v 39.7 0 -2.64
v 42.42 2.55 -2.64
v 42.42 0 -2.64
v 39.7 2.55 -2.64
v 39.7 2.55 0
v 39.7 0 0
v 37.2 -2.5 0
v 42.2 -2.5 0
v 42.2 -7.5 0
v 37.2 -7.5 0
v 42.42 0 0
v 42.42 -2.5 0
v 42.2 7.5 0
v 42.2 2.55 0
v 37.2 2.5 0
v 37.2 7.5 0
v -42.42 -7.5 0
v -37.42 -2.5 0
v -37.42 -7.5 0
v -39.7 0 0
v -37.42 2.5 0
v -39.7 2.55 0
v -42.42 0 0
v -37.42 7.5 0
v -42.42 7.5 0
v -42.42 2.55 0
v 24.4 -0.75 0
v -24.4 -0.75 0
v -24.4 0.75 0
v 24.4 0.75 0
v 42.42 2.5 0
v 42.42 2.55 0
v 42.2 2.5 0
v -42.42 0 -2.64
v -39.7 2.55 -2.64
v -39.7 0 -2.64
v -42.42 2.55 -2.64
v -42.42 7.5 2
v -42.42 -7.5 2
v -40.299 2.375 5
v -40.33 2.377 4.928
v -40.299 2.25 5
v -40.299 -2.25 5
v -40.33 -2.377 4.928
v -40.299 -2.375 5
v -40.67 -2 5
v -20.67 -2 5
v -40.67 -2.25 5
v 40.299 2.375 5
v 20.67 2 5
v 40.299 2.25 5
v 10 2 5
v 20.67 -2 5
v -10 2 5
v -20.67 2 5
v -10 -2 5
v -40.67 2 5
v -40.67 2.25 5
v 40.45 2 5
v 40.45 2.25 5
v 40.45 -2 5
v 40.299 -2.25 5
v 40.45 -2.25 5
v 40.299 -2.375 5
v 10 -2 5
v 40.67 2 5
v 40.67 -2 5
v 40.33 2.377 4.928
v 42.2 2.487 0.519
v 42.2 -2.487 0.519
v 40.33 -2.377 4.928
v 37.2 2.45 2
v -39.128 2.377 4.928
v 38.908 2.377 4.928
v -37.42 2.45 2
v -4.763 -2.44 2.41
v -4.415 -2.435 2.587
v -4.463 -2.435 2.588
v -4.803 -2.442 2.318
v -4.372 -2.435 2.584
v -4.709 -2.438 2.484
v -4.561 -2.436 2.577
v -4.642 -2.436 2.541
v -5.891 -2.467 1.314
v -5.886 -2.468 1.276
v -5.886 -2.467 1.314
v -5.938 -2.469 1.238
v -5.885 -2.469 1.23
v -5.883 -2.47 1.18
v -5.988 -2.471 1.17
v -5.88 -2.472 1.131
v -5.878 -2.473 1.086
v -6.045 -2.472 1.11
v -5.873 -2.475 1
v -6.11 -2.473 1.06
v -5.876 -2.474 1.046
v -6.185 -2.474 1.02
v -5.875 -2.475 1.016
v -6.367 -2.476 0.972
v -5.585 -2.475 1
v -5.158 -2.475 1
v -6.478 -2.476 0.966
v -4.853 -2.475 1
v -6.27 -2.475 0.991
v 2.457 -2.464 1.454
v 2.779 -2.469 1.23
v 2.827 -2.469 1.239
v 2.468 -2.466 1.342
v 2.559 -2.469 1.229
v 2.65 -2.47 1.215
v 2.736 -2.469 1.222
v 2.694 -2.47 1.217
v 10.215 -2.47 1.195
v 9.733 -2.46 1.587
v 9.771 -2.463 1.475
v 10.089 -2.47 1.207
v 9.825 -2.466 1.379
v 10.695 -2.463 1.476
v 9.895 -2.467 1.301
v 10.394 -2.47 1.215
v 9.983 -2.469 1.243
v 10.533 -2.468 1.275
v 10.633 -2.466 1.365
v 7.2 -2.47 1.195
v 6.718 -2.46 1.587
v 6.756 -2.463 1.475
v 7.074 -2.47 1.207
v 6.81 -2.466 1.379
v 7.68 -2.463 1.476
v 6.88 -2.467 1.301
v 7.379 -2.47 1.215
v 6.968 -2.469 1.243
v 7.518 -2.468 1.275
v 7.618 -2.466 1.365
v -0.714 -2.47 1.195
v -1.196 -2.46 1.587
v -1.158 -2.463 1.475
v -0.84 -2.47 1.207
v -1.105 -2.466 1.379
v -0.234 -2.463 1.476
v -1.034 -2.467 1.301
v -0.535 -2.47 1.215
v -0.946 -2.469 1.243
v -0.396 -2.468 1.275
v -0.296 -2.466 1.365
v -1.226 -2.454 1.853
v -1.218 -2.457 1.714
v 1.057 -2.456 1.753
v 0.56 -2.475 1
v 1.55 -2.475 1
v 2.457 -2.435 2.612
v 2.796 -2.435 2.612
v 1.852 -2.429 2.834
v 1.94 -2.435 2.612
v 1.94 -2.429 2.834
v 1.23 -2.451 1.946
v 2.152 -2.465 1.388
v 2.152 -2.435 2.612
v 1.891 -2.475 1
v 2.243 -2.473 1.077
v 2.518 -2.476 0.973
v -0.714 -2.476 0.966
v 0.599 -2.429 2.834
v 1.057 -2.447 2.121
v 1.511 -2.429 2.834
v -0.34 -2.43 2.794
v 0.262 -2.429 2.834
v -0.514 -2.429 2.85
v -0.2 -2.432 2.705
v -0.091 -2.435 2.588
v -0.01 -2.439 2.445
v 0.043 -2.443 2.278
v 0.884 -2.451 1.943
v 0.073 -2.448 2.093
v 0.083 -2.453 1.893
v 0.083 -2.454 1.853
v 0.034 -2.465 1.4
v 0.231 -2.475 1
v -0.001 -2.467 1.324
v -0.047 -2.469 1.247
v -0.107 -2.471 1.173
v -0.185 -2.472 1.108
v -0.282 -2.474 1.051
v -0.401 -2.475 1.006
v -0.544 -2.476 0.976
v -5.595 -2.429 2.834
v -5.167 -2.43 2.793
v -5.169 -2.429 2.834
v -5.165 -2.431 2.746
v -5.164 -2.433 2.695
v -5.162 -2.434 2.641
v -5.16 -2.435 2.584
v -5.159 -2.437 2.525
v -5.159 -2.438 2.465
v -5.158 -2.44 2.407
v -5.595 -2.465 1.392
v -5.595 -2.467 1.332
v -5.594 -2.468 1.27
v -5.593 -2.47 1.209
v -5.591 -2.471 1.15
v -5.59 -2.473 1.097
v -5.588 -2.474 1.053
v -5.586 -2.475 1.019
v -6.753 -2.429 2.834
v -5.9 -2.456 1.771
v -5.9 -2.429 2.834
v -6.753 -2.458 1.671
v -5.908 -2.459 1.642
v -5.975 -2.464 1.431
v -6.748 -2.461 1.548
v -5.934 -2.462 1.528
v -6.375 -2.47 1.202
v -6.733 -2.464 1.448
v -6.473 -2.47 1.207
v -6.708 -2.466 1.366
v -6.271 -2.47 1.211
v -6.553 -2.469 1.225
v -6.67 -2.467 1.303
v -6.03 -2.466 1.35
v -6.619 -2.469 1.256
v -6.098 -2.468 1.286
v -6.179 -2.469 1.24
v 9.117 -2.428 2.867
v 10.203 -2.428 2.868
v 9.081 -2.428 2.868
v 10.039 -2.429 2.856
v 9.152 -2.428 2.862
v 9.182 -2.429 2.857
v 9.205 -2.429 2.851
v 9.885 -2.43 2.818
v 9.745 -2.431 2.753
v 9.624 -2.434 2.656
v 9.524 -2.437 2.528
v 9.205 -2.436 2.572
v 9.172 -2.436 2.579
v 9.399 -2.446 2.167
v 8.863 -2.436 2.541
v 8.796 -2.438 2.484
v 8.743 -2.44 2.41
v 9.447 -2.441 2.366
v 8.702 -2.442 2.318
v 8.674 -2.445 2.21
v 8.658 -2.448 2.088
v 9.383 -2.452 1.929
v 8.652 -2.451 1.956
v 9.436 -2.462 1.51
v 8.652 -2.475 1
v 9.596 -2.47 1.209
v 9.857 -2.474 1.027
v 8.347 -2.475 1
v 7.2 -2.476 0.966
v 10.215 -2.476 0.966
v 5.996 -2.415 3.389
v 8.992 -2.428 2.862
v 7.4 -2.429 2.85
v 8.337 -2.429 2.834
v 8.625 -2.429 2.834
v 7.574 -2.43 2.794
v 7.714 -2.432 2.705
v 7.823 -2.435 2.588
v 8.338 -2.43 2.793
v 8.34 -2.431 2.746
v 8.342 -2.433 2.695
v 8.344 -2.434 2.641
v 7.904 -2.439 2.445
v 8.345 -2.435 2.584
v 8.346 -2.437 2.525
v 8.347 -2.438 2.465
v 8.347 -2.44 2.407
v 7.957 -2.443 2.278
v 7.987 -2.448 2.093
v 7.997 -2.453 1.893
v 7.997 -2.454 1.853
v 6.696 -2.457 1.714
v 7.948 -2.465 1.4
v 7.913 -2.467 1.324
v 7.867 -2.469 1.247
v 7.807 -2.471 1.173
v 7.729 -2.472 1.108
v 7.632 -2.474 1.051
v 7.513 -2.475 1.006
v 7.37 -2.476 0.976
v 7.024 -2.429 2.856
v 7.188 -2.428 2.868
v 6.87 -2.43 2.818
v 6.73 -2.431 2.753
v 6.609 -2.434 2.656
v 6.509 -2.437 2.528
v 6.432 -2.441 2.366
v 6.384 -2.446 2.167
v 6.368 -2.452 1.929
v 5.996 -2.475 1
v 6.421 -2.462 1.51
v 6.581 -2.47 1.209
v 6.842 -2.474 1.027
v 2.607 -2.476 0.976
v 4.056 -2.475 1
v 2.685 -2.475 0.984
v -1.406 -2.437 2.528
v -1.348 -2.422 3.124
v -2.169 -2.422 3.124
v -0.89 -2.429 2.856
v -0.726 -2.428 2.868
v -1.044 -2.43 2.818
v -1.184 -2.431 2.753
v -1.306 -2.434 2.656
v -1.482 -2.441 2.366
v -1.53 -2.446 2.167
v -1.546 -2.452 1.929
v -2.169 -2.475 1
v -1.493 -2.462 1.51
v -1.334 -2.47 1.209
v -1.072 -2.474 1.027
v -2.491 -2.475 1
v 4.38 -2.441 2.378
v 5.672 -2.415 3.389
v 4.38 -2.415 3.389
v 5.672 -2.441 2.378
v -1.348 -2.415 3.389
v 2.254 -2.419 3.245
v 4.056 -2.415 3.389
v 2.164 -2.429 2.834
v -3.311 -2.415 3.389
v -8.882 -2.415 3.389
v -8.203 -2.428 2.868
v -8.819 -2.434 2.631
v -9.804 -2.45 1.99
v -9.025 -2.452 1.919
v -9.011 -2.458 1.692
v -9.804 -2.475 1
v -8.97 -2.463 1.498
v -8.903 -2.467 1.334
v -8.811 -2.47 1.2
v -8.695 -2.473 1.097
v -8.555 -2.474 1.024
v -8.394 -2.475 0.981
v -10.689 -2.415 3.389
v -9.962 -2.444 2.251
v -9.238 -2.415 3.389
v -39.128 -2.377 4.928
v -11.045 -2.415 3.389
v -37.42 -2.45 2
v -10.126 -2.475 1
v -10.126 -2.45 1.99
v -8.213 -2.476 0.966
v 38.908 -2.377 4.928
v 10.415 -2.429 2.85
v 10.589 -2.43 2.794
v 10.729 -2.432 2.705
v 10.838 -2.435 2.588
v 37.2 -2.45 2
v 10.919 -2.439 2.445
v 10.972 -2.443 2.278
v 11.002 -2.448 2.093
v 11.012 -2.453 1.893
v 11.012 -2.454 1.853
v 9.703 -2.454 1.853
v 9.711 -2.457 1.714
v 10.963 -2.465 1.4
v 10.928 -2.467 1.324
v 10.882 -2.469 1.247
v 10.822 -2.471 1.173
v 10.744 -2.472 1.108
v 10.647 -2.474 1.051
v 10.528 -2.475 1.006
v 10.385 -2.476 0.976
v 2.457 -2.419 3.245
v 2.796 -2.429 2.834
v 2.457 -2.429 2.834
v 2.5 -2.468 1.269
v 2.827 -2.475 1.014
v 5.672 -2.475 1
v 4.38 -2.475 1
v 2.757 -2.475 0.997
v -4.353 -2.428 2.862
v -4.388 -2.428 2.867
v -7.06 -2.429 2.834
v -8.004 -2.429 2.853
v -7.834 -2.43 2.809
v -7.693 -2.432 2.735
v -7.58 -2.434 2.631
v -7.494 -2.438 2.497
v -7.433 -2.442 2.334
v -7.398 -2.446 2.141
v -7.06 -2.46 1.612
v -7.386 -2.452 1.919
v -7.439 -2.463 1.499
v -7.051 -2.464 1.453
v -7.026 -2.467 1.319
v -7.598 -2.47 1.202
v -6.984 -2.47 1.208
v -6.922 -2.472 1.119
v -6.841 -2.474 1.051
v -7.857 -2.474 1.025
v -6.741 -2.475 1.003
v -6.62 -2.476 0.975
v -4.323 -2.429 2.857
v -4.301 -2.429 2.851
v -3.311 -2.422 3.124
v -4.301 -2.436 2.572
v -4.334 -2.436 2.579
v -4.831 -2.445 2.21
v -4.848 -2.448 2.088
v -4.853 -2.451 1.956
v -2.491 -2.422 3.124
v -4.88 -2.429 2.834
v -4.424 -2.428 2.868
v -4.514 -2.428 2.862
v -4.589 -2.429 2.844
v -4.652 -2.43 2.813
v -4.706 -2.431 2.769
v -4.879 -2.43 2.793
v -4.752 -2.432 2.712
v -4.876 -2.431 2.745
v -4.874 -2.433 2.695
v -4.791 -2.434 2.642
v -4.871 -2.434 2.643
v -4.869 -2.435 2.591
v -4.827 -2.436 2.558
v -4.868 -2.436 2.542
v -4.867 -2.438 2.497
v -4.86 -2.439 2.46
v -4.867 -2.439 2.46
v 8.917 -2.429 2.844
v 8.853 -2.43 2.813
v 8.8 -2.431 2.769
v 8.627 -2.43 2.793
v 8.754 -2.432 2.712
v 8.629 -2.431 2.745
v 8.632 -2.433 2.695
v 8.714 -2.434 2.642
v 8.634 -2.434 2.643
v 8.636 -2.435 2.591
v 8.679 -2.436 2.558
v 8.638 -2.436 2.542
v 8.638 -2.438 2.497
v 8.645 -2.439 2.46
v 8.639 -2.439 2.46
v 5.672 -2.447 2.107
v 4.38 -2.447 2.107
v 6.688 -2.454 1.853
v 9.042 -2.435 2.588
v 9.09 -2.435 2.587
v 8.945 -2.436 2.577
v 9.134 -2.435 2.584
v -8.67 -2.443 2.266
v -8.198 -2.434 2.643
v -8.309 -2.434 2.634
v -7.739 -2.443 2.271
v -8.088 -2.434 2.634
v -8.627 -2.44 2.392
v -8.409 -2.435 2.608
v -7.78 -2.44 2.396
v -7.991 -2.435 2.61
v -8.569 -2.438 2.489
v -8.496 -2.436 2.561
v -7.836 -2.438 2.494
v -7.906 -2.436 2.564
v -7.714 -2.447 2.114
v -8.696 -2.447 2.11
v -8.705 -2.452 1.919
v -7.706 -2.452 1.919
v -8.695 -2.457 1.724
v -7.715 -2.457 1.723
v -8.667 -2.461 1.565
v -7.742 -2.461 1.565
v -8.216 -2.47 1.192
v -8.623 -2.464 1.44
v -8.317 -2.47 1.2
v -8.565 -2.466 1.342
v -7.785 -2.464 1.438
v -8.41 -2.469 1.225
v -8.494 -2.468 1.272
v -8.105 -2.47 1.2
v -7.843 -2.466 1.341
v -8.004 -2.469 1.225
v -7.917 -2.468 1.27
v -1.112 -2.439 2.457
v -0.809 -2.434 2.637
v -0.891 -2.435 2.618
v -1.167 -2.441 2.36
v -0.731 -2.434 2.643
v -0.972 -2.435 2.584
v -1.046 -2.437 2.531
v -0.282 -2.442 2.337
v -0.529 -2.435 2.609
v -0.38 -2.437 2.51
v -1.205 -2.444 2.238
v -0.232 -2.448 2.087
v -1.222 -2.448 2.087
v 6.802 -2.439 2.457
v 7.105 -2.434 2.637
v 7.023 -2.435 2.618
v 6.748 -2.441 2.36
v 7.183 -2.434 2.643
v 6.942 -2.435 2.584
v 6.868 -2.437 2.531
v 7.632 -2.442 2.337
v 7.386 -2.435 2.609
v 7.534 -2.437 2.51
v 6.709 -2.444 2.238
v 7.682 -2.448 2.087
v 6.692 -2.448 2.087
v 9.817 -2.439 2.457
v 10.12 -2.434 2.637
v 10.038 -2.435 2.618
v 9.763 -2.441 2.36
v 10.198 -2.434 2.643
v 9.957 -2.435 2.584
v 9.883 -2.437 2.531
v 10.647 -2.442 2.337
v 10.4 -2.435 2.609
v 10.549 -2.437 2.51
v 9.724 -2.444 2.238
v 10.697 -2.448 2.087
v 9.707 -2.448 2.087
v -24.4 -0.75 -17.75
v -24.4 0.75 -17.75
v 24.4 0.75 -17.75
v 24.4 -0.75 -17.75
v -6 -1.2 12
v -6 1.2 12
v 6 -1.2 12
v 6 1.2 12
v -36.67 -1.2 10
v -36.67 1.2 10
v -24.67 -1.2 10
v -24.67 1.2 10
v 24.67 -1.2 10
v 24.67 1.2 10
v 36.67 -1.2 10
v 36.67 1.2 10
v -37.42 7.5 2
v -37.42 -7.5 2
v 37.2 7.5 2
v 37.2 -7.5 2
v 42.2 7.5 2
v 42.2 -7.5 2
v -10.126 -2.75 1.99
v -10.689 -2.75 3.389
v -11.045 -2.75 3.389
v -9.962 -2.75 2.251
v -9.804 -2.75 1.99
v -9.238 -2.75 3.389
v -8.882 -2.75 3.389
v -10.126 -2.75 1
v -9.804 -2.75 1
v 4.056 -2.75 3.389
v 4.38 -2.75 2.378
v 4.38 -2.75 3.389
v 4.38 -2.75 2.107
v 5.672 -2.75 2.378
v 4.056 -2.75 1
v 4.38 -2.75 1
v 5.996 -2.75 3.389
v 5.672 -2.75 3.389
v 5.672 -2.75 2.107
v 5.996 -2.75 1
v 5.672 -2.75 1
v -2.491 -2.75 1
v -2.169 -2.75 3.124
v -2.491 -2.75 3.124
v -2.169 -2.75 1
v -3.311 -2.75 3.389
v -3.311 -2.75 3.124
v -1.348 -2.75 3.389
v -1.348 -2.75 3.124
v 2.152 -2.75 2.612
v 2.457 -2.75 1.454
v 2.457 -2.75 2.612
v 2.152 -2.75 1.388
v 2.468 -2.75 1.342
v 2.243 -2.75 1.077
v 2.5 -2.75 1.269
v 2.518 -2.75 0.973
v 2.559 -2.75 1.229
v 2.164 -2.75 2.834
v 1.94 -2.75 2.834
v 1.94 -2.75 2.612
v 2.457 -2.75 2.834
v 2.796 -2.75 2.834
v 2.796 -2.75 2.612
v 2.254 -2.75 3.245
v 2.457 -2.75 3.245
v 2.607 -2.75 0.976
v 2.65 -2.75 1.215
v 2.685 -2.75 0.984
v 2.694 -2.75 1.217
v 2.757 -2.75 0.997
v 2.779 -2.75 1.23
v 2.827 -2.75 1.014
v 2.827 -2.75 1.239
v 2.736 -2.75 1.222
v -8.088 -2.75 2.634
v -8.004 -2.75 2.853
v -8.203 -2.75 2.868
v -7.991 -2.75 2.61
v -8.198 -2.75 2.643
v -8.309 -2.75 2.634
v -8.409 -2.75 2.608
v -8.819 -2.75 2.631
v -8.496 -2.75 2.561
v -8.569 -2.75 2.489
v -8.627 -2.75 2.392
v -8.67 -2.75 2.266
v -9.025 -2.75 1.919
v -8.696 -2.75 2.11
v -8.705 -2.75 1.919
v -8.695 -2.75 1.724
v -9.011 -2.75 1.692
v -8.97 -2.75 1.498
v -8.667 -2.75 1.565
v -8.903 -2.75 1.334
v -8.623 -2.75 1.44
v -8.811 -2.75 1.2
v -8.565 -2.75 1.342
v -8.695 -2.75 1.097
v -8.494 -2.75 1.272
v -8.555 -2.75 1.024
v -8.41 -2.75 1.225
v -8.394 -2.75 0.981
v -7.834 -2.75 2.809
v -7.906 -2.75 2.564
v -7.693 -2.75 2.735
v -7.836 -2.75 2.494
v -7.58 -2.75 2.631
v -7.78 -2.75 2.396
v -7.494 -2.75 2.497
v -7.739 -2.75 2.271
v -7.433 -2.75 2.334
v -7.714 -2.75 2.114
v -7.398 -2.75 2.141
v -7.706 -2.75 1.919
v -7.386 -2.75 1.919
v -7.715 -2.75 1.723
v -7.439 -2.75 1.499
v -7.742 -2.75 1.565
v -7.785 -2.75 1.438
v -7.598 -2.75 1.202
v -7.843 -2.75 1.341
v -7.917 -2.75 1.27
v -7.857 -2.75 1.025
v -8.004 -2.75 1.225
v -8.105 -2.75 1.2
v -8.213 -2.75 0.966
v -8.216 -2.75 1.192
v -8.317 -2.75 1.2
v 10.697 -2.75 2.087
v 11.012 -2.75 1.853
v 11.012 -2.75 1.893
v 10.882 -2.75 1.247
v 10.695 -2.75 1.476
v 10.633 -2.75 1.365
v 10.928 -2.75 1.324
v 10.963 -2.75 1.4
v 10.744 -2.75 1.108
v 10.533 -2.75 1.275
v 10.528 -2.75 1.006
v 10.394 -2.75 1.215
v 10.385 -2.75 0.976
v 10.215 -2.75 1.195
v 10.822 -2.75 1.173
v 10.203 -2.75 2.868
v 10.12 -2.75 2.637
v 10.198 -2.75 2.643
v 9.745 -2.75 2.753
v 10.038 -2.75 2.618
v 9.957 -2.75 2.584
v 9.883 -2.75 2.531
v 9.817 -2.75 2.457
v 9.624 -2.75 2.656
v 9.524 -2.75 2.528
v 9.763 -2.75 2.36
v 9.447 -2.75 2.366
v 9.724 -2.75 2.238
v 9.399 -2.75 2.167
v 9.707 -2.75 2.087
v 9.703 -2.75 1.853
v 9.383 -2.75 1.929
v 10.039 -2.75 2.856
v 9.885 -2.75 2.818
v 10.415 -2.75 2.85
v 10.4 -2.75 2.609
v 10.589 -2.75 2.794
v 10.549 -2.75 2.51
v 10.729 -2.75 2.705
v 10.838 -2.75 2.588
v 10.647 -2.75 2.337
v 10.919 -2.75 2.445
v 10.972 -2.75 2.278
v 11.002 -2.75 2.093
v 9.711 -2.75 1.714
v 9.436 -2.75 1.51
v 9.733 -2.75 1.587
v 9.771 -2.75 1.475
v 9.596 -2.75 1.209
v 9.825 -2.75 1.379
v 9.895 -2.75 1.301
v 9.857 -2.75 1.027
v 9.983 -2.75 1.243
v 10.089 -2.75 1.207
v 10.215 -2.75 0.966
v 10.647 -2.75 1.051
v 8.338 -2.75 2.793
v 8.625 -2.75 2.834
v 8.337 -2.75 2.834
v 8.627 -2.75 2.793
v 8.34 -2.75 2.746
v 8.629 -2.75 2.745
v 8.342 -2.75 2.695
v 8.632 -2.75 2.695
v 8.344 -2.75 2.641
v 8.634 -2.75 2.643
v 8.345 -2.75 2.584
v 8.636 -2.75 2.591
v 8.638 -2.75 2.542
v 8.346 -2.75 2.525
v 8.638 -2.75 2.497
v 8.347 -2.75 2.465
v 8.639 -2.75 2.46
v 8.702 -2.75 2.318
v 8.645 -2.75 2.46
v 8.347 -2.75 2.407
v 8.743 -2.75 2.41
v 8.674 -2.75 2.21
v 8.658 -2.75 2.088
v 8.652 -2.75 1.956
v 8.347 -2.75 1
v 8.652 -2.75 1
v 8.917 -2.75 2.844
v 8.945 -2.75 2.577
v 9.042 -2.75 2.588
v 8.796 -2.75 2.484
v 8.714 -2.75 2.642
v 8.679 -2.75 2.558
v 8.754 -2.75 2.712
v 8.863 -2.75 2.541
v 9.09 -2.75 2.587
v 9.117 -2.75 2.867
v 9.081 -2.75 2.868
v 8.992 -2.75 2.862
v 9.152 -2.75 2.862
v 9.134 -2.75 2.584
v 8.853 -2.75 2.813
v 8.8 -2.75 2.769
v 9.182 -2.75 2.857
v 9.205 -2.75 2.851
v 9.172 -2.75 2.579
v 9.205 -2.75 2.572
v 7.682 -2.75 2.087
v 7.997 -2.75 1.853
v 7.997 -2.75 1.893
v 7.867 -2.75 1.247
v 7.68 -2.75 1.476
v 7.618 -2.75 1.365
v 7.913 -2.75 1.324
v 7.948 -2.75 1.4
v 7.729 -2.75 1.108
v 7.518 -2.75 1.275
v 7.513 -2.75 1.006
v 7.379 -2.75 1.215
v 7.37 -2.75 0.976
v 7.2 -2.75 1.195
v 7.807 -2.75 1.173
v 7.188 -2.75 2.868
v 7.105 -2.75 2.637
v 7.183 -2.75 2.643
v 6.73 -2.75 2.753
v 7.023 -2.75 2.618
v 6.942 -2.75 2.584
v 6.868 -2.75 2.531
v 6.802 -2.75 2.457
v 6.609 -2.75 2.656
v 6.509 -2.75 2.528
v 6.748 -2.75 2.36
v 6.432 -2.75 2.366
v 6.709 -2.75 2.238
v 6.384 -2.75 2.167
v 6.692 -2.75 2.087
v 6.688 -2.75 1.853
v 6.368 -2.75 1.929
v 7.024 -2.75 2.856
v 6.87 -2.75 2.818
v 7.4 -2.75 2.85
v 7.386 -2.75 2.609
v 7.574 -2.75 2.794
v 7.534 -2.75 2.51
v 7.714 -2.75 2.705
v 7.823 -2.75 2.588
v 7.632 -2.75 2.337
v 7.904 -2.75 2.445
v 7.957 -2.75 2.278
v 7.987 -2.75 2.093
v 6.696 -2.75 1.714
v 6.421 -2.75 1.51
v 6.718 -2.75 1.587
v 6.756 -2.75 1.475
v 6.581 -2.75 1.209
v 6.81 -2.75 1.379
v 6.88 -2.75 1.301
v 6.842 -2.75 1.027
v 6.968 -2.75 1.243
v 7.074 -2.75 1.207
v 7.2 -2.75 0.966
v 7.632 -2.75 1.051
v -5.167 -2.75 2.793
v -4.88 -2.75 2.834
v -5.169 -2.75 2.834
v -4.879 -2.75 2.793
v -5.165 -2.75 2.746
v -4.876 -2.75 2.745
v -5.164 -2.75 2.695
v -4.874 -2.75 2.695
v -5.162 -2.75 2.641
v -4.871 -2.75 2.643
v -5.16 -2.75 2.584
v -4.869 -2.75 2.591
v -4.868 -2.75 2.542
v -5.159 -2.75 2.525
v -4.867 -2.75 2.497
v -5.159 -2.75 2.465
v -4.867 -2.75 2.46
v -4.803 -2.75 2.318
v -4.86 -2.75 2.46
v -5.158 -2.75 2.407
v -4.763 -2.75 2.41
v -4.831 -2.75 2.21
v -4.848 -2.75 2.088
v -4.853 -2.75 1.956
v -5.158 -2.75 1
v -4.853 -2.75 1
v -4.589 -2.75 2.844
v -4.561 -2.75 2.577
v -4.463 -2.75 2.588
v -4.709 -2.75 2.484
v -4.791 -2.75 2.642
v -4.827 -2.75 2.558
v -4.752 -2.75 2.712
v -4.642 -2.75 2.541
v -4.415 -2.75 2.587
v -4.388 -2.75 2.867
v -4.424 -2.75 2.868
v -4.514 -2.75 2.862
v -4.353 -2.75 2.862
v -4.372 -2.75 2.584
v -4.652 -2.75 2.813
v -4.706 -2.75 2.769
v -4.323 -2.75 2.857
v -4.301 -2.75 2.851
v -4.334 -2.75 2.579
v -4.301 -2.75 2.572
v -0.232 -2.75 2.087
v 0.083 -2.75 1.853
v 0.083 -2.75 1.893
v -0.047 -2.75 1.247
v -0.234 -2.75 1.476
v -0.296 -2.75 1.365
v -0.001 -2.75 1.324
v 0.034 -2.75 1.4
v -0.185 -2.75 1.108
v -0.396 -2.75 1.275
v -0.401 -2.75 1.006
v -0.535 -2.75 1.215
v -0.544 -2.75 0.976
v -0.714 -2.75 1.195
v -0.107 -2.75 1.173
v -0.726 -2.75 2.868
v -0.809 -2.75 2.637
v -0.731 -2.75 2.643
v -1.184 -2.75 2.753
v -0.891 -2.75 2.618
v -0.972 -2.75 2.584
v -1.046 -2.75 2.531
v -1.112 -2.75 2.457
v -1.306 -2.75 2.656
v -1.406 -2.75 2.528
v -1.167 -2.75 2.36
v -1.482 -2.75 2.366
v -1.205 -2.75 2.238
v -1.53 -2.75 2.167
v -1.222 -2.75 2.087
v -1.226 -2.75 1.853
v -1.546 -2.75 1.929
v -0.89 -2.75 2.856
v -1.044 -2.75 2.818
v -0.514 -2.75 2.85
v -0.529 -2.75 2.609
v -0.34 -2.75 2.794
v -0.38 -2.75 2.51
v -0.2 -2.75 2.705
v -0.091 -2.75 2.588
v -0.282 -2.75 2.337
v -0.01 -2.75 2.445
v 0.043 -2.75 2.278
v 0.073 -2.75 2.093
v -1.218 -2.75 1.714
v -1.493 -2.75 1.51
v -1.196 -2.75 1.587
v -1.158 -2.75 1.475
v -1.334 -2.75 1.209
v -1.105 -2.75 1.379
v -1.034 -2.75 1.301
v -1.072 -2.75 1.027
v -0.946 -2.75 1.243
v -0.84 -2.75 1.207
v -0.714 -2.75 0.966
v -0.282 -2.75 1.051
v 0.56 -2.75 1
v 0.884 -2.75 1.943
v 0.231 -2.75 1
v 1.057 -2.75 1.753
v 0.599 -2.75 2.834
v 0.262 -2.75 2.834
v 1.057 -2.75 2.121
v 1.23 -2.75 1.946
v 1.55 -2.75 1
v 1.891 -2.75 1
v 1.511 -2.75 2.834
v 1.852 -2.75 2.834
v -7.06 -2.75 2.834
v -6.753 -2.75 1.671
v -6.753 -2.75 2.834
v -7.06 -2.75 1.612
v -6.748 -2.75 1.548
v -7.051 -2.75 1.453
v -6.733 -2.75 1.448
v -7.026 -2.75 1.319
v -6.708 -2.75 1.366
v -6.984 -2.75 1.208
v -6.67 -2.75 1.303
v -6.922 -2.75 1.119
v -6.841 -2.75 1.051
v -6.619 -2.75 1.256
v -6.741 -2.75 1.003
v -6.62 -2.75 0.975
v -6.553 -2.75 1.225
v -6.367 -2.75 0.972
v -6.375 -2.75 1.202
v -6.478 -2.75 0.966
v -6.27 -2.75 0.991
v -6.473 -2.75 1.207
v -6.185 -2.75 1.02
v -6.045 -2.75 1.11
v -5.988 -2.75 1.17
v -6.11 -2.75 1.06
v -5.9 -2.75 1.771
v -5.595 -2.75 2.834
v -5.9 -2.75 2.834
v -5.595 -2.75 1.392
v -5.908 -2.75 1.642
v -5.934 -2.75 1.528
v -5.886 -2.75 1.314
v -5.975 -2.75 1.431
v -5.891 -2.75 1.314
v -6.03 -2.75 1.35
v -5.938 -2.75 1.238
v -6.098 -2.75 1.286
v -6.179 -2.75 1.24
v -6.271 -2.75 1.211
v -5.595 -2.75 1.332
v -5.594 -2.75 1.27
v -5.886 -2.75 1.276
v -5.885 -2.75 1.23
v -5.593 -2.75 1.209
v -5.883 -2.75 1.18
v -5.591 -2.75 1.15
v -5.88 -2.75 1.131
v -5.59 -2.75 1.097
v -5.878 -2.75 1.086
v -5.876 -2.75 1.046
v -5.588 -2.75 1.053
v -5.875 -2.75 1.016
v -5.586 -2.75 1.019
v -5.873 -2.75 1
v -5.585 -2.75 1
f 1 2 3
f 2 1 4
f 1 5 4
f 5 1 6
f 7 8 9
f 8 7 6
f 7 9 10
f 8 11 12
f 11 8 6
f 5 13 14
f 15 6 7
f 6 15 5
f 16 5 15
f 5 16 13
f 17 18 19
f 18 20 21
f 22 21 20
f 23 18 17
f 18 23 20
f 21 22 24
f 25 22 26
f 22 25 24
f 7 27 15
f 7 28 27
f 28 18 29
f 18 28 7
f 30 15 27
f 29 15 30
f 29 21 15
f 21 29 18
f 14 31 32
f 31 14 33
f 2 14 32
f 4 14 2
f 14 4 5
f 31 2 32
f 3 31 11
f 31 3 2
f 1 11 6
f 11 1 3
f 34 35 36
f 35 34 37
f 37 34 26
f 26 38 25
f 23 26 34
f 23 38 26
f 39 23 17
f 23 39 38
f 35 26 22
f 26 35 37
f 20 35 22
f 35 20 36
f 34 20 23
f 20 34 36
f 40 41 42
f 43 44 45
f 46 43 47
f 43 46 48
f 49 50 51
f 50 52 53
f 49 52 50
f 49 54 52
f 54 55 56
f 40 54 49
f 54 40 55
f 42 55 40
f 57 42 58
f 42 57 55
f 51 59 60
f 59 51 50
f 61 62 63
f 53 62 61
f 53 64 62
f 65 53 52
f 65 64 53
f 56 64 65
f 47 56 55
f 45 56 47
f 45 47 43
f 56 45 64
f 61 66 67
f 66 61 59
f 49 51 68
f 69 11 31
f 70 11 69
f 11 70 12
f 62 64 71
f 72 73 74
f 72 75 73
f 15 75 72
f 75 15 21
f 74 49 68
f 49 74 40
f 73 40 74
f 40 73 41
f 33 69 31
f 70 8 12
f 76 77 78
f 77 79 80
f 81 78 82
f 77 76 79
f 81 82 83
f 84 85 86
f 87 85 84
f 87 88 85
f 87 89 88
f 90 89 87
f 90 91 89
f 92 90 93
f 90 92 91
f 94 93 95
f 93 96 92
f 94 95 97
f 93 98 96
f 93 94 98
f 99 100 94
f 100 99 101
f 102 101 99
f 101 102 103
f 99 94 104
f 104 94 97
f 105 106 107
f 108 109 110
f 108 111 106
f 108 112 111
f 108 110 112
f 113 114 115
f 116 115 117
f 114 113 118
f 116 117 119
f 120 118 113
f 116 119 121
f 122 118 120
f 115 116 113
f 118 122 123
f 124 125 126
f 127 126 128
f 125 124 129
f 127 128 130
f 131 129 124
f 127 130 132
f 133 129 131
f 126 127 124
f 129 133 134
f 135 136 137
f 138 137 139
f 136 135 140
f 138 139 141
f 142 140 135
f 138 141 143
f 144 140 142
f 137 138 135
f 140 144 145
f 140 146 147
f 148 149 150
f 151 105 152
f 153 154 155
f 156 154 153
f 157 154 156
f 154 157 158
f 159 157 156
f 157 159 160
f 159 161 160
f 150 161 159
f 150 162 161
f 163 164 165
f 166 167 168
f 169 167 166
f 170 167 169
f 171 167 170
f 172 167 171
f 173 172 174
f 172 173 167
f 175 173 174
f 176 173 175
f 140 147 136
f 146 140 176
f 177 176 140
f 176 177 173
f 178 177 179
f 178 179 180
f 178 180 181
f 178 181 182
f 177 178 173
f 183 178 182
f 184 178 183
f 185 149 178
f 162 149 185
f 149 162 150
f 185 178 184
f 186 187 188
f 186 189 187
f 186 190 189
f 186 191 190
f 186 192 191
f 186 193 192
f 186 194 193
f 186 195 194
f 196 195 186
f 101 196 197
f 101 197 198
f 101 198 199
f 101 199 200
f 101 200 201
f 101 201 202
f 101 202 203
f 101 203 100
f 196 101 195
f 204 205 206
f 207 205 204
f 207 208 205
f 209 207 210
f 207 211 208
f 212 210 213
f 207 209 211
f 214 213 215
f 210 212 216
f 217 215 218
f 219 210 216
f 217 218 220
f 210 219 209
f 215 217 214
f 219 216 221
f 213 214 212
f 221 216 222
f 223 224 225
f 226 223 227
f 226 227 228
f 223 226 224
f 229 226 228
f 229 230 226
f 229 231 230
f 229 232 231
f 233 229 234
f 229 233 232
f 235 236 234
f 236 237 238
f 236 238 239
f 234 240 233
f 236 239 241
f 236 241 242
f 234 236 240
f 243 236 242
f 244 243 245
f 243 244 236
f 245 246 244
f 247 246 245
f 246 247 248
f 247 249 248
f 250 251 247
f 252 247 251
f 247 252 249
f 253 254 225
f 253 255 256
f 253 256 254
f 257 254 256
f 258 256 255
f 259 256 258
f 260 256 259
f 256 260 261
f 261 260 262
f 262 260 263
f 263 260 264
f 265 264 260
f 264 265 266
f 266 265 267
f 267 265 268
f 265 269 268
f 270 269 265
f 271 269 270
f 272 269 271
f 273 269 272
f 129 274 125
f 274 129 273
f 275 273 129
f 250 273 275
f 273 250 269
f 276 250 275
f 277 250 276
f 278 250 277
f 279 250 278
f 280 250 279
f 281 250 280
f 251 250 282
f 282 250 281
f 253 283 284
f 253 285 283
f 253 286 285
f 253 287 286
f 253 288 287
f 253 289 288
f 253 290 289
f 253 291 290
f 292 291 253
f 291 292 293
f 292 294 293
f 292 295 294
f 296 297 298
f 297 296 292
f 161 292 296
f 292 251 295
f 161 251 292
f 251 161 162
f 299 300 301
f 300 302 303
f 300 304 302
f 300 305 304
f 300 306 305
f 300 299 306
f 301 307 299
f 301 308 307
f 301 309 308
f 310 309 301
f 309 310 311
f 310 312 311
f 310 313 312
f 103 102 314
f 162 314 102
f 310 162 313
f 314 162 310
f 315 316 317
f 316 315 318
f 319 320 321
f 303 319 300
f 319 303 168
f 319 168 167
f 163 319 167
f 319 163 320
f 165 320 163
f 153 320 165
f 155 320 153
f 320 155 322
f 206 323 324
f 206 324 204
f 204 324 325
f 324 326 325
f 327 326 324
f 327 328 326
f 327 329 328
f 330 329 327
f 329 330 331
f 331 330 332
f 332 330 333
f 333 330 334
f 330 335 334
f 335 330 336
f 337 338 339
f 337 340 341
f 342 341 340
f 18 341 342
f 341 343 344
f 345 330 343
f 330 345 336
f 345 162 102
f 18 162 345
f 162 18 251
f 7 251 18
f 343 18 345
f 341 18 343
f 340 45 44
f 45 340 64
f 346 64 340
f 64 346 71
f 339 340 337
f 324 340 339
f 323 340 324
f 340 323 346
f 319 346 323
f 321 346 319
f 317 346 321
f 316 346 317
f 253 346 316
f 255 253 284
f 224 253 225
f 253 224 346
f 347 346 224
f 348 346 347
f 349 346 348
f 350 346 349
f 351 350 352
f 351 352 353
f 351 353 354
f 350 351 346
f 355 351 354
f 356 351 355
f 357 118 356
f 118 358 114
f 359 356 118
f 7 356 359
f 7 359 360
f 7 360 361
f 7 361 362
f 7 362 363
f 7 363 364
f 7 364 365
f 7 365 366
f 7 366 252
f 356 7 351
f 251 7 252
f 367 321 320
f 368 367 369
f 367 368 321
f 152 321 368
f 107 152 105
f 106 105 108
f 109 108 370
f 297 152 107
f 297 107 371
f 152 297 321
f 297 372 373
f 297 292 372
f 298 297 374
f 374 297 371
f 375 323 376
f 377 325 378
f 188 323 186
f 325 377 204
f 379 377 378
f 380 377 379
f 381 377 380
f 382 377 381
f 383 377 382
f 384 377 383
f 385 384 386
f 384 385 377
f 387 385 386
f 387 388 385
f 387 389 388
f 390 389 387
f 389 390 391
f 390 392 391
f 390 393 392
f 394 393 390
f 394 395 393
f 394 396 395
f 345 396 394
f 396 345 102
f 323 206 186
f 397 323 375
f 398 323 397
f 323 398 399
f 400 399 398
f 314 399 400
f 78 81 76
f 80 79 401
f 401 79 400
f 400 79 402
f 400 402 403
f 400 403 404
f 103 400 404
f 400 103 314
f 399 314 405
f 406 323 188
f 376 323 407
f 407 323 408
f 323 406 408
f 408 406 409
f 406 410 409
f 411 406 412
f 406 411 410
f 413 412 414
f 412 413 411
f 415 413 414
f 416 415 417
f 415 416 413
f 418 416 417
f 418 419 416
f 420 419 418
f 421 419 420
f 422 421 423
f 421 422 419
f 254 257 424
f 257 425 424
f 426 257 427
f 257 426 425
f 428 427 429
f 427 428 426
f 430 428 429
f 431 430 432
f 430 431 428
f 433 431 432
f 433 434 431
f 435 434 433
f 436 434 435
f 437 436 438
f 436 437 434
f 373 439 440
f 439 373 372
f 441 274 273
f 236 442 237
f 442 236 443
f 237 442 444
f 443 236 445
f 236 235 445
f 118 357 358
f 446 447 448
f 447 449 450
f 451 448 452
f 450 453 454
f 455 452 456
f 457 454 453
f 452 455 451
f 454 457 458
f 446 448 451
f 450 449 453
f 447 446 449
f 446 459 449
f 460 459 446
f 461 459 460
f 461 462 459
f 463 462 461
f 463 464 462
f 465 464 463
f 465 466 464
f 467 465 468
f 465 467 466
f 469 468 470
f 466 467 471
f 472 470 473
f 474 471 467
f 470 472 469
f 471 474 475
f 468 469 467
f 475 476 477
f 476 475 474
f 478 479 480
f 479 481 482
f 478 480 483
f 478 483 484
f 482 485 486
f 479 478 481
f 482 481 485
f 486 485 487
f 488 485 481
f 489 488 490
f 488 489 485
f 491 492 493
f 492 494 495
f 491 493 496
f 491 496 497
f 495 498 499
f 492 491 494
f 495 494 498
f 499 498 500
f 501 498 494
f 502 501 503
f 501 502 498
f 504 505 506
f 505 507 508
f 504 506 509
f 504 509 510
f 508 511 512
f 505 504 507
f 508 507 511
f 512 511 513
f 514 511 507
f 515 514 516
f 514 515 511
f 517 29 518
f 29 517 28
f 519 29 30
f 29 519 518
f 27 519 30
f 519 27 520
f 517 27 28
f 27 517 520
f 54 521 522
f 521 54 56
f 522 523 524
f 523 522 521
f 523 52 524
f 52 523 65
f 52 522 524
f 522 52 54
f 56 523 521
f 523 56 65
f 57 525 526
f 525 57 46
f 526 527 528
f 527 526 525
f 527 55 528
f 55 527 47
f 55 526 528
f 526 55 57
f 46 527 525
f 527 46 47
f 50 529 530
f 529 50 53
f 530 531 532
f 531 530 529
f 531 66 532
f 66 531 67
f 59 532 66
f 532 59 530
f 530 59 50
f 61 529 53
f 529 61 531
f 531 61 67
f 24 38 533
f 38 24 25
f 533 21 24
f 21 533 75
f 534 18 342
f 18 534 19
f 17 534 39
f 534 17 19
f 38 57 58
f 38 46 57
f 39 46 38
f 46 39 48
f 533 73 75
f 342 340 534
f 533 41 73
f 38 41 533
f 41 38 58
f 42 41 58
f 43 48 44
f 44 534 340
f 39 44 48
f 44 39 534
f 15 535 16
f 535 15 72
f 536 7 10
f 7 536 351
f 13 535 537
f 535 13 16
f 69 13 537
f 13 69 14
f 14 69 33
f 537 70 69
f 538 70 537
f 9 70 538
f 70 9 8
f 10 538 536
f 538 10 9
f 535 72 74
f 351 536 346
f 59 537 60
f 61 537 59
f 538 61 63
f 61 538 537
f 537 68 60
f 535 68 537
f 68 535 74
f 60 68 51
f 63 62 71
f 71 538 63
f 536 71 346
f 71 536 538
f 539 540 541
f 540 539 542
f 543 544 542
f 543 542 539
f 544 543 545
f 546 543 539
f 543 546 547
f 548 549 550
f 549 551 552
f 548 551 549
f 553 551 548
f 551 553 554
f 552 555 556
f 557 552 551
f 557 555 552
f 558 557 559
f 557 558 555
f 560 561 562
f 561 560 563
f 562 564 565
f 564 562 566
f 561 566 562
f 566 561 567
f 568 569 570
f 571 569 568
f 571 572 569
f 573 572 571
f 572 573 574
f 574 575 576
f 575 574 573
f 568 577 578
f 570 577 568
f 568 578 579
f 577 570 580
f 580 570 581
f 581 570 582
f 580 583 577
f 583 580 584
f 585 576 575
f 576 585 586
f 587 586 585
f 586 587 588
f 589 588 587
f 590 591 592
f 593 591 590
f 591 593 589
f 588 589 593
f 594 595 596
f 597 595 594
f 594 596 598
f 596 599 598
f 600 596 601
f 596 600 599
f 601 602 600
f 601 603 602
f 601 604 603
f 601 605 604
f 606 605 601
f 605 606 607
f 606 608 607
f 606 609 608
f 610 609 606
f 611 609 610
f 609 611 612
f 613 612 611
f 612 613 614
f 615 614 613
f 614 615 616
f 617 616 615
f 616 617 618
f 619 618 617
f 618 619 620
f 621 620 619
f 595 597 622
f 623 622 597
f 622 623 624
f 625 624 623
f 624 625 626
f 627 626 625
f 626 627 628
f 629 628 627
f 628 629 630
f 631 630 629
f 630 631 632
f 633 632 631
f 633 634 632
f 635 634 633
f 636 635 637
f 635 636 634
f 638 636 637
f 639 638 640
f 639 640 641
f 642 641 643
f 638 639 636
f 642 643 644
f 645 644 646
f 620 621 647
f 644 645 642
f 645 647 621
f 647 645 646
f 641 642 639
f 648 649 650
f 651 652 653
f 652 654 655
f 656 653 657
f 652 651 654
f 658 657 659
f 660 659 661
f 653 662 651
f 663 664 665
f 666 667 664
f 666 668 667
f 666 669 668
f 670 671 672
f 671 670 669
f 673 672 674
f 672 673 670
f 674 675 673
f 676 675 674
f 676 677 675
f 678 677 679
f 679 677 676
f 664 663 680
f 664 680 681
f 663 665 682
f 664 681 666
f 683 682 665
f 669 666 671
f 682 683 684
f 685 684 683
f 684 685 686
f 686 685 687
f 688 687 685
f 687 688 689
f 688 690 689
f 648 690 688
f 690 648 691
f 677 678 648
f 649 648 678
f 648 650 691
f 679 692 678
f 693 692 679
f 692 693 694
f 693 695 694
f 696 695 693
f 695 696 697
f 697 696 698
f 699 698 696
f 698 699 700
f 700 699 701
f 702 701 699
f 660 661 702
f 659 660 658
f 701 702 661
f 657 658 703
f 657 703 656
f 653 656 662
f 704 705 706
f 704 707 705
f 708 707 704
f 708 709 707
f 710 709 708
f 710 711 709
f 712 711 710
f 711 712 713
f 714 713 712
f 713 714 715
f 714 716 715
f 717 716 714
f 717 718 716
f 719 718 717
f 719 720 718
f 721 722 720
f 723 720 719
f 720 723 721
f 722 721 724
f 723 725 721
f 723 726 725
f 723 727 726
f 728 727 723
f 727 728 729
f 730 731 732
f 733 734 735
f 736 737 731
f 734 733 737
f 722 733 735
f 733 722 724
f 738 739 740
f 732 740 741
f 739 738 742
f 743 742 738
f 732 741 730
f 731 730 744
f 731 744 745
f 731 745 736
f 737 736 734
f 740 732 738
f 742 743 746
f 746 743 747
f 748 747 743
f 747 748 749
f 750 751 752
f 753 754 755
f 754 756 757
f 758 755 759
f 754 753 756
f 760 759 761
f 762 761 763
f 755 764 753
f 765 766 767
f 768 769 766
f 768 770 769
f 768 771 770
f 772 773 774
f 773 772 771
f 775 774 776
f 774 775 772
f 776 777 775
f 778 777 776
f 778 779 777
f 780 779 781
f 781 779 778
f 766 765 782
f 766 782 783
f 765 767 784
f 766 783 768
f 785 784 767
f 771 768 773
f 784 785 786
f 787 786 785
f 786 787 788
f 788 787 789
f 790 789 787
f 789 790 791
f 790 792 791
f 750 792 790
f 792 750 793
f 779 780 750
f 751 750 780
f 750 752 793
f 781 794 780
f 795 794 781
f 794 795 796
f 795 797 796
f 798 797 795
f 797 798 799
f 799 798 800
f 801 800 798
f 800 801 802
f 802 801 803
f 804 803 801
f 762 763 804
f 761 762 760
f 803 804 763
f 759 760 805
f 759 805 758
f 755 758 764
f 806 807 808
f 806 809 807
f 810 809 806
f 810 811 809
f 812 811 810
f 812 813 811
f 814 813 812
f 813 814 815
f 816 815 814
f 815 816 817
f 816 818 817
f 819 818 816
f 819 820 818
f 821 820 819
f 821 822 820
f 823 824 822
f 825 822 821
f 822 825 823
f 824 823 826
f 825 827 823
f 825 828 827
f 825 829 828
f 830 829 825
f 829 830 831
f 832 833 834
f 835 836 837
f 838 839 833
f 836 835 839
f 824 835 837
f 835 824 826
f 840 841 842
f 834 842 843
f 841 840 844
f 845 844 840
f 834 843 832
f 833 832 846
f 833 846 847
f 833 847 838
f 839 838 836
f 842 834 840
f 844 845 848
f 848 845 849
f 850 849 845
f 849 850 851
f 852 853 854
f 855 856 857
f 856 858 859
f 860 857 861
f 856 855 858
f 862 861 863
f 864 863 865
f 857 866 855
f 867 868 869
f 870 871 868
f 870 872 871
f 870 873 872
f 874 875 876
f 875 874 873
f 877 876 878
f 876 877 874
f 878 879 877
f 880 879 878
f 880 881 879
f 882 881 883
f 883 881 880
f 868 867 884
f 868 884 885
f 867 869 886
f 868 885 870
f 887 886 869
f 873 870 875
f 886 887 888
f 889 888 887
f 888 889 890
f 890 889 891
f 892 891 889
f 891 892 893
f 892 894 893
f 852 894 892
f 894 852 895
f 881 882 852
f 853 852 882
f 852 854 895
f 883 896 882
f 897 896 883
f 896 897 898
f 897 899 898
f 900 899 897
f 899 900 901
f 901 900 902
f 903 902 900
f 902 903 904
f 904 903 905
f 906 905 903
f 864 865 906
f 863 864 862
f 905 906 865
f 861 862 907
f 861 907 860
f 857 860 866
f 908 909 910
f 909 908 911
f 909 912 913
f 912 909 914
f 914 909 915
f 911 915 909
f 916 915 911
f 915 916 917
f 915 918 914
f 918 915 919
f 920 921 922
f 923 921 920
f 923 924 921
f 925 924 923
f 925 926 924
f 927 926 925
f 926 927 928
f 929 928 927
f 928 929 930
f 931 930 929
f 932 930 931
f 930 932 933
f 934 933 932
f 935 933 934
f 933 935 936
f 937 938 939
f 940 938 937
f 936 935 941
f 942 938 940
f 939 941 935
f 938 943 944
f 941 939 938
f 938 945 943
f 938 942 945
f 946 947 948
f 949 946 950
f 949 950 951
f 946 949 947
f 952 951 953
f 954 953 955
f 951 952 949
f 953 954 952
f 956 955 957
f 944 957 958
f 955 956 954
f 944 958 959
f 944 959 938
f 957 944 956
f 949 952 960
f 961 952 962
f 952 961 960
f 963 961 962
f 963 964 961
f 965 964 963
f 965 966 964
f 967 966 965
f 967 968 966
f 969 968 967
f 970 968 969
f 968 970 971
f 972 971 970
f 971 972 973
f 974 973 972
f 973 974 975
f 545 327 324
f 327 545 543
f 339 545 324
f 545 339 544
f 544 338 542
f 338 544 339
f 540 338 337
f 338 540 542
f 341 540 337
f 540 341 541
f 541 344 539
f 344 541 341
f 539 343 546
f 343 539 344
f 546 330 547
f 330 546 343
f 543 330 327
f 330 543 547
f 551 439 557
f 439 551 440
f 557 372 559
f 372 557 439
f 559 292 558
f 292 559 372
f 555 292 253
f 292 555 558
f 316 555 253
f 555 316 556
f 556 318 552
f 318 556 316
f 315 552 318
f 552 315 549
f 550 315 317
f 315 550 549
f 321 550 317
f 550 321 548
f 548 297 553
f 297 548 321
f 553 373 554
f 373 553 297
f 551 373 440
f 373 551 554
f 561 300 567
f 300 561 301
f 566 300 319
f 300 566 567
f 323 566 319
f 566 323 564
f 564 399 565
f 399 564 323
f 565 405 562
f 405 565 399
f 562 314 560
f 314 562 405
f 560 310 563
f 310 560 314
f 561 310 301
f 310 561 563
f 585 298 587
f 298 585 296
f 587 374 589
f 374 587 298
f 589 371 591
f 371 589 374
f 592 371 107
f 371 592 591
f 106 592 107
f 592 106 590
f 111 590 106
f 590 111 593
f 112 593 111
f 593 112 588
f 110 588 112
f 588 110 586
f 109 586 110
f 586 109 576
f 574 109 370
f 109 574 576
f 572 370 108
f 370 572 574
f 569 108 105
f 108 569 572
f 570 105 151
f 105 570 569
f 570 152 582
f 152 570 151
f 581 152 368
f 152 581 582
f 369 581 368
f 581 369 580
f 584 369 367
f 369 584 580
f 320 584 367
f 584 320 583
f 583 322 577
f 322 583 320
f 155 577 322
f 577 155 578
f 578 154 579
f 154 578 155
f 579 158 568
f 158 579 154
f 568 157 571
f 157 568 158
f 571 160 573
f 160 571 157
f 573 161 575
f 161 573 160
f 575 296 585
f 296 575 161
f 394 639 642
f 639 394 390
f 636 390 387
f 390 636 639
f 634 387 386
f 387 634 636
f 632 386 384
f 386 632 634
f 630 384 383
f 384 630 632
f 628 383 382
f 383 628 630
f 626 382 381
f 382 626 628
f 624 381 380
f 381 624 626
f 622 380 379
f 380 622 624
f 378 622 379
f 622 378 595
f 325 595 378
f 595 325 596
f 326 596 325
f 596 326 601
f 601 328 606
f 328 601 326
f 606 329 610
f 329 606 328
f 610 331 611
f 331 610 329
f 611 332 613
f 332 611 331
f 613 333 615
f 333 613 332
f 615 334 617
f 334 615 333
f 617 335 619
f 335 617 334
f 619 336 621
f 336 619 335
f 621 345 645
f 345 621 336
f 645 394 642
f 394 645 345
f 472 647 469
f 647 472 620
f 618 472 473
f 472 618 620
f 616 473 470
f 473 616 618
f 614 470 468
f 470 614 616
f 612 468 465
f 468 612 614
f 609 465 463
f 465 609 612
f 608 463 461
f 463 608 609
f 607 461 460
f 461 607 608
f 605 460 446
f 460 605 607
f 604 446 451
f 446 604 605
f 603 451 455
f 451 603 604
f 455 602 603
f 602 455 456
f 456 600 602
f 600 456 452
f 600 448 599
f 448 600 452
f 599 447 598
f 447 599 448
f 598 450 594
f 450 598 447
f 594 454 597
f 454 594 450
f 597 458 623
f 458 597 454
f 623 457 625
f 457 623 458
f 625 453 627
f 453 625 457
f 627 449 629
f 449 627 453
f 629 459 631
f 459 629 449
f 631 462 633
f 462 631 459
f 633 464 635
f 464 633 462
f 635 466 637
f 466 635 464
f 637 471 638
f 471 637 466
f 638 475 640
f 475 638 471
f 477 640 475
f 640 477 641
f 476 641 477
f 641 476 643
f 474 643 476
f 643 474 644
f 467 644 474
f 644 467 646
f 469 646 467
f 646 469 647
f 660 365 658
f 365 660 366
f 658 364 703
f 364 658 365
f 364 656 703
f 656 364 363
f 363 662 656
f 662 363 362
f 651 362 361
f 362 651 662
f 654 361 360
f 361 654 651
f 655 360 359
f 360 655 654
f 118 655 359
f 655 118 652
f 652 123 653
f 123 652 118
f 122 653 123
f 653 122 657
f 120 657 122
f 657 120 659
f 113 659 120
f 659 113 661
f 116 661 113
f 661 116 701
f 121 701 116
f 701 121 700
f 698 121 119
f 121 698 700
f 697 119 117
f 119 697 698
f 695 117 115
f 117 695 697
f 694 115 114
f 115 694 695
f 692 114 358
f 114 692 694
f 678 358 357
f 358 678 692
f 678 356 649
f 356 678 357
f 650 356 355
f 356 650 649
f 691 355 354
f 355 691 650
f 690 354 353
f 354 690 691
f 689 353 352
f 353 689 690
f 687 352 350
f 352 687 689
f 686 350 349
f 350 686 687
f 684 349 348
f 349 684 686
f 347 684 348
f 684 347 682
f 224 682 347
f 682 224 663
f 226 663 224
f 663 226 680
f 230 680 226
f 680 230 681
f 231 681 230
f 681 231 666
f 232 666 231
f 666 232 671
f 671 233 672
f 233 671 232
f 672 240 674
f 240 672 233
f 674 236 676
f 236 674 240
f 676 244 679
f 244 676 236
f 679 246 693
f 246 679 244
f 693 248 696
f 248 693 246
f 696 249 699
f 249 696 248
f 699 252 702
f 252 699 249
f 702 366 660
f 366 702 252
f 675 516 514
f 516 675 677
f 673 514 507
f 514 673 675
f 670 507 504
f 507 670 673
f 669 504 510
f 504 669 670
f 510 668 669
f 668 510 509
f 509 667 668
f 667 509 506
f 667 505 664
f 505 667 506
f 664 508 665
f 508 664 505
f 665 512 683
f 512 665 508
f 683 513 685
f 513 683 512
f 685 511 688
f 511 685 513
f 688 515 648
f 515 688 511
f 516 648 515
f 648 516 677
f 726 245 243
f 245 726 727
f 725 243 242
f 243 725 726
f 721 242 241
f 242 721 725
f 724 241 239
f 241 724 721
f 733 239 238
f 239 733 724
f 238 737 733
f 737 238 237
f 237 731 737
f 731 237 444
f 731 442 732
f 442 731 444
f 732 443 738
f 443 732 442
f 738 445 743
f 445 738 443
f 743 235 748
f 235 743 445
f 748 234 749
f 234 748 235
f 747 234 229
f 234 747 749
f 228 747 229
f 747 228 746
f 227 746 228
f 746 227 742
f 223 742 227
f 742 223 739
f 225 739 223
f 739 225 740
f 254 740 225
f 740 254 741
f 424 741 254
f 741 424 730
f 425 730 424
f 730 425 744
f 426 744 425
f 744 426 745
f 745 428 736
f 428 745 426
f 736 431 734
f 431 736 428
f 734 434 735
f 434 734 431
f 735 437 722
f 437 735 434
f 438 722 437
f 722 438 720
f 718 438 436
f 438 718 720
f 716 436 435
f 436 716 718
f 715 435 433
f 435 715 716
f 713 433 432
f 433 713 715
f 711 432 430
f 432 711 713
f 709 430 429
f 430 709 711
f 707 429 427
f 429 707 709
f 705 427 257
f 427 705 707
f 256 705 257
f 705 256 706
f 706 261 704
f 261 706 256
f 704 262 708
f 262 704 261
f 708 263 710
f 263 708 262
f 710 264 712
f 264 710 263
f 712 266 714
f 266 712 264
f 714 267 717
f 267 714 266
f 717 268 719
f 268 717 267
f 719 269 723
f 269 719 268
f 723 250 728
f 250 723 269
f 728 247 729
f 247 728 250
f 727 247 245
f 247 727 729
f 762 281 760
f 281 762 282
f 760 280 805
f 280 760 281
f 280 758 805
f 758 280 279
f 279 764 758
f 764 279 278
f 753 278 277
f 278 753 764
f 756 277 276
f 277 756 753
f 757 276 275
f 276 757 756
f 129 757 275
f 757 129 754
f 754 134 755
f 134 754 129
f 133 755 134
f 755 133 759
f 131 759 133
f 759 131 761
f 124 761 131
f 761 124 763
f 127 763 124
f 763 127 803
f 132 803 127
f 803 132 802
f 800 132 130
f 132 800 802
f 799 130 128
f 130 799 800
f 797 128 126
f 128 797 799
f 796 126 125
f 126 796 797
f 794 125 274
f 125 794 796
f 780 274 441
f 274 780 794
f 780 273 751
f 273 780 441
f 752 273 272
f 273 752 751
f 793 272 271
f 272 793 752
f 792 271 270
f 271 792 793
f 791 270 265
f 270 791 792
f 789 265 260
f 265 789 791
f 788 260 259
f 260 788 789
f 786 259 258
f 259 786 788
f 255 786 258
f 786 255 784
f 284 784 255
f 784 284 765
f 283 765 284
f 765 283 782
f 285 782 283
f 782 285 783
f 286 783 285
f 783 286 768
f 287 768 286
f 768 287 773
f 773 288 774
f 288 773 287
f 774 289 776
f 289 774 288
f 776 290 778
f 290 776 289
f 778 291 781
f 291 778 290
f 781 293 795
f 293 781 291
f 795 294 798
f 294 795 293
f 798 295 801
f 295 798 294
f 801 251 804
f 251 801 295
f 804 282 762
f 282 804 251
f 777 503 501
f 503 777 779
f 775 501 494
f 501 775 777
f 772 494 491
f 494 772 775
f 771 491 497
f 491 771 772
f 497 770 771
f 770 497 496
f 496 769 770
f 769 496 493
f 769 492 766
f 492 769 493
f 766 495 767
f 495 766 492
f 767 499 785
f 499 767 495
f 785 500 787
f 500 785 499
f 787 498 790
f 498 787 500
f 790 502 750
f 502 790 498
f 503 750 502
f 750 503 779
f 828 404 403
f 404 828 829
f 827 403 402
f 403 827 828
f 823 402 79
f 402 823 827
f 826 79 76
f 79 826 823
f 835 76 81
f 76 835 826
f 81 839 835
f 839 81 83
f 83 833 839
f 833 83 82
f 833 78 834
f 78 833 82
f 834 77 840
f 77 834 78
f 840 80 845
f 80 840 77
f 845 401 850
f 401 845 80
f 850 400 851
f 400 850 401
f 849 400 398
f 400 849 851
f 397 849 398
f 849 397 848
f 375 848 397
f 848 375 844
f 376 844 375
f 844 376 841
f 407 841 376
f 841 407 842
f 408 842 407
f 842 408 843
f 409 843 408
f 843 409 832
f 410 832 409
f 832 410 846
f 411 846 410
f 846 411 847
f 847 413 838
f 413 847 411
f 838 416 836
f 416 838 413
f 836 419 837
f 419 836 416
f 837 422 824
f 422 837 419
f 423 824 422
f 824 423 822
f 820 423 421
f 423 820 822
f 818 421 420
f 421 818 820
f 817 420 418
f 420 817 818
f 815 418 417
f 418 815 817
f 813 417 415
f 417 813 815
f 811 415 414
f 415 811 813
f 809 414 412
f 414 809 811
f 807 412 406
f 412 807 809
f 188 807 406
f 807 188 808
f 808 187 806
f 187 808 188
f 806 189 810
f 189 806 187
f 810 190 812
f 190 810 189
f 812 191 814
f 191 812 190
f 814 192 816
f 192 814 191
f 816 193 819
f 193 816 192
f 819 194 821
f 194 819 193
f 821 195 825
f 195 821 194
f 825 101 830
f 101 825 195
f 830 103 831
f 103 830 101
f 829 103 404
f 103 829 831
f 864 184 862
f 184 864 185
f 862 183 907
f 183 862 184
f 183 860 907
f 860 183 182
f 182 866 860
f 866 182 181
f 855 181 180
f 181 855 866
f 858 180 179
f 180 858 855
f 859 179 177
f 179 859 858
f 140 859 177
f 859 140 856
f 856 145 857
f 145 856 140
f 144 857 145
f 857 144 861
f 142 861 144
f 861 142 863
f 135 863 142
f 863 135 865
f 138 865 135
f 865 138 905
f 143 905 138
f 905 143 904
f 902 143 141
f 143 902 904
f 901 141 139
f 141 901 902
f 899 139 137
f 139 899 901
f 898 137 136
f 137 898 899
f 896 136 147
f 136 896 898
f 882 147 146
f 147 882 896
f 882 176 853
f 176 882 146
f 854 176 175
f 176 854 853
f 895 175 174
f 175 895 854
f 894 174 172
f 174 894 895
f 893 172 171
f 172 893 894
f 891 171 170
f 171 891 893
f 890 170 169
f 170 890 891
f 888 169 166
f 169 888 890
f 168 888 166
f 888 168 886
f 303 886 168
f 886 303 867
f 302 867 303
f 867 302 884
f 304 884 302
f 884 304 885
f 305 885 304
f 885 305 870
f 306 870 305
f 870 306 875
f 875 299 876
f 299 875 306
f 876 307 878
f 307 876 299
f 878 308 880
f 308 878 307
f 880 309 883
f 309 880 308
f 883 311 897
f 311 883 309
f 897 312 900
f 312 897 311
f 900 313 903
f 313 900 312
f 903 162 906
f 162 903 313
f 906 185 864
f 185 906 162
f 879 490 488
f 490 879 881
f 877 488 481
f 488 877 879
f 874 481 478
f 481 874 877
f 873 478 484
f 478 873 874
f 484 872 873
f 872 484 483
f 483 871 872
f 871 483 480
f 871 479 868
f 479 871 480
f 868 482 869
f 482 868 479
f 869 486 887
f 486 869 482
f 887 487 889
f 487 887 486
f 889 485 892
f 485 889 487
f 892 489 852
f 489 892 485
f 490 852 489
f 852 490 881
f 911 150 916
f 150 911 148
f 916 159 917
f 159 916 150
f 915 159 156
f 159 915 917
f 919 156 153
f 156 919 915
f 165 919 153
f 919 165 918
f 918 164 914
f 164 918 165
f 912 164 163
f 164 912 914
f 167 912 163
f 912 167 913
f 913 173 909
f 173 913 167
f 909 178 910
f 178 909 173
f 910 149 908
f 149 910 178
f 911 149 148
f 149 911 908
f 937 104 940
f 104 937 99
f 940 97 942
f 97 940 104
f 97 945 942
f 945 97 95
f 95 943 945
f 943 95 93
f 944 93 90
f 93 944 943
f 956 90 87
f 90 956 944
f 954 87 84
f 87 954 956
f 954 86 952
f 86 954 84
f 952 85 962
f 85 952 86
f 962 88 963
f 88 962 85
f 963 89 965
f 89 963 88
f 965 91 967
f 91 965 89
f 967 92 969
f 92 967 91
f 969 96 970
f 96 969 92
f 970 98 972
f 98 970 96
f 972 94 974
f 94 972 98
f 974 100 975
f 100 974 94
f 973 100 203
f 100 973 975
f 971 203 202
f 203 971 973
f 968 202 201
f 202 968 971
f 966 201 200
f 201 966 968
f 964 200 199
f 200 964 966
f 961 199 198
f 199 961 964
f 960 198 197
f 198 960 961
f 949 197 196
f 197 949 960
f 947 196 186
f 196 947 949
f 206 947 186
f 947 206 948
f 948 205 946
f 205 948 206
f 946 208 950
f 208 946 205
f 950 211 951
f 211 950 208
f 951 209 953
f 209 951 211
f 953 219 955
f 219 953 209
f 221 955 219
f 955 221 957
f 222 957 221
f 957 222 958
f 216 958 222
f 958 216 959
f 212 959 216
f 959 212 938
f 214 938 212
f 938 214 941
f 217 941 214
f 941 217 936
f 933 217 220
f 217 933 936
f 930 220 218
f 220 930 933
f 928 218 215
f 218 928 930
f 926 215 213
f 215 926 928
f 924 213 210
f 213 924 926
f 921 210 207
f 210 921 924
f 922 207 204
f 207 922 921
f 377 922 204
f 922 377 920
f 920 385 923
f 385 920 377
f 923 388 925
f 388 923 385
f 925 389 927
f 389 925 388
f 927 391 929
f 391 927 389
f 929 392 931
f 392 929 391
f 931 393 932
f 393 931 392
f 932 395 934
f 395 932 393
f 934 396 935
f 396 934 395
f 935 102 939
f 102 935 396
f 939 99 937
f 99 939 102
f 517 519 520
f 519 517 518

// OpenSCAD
echo(version=version());
// Parameters used to generator model (Values are measured in mm)

tooth_count = 1; // Number of wells
tooth_width = 48.8; // Width of each tooth
tooth_thickness = 1.5; // Thickness of each tooth
tooth_gap = 1.6; // Spacing between teeth.
tooth_length = 17.75;  // Length of teeth (measured perpendicular from bottom of support)
text_label = "Your Text Here"; // Label or name you want to appear on the side
tooth_support = 6;// Height of upper support on teeth

// Include square blocks on bottom of support
locking_block_supports = "yes"; // [yes, no]

//Main block of code
union() { 

// Primary support bar 
    translate([0, 0, 0])
    linear_extrude(height = 5, scale = 0.95)
    square([body_x, body_y], center = true);

// Teeth support  
    translate([0, 0, -tooth_support])
    linear_extrude(height = tooth_support)
    square([(tooth_width*tooth_count)+(tooth_gap*(tooth_count-1)), tooth_thickness], center = true);

//Handles
     // Handle Center
        translate([0, 0, body_z])
        linear_extrude(height = 7, scale = 0.6)
        square([20, 4], center = true);
    // Handle left
        translate([(-body_x/2)+11.75, 0, body_z])
        linear_extrude(height = 5, scale = 0.6)
        square([20, 4], center = true);
    // Handle right
        translate([(body_x/2)-11.75, 0, body_z])
        linear_extrude(height = 5, scale = 0.6)
        square([20, 4], center = true);

// Left support square
	// Support base 
        translate([(-body_x/2)+2.5, 0, 0])
    	linear_extrude(height = 2)
    	square([5, 15], center = true);
	// Angled Support
        translate([(-body_x/2)+2.5, 0, 2])
        linear_extrude(height = 3, scale = 0.3)
        square([5, 15], center = true);
    
// Right support square
	// Support base 
        translate([(body_x/2)-support_x, 0, 0])
    	linear_extrude(height = 2)
    	square([5, 15], center = true);
    // Angled Support
        translate([(body_x/2)-support_x, 0, 2])
        linear_extrude(height = 3, scale = 0.3)
        square([5, 15], center = true);

// Text placed on body of comb
    logo(text_label); 

// Locking Blocks.
	if(locking_block_supports == "yes")
	{
    
    // Right
        translate([(body_x/2)-support_x, 0, -support_z]) linear_extrude(height = support_z) square([support_x, support_y], center = false); 

    // Left
        translate([-body_x/2, 0, -support_z]) linear_extrude(height = support_z) square([support_x, support_y], center = false); 
	}

//Teeth
	translate([tooth_margin, 0, -tooth_length/2]) union() {
		for(i = [0:tooth_count-1]) {
			translate([i * (tooth_width + tooth_gap), 0, 0]) 
            cube([tooth_width, tooth_thickness, tooth_length], center=true);
		}
	}
}

body_x = 84.84;
body_z = 5;
body_y = 5;

support_x = 2.72;
support_y = 2.55;
support_z = 2.64;

tooth_margin = -(((tooth_count-1)*tooth_width)/2+((tooth_count-1)*tooth_gap)/2); 

module logo(t, s = 2.5, style = "") {
  translate([0, -body_y/2+.75, 1])
    rotate([90, 0, 0]) color("red")
    linear_extrude(height = 1)
    text(t, size = s, font = str("Liberation Sans", style),  halign = "center");
}
/*
* Customizable Electrophoresis Comb
* 
* Copyright (c) 2016 Adm Chrysler
* www.admchrysler.com / chrysler@cornell.edu
* Licensed under the Creative Commons
* Attribution - Non-Commercial - Share Alike license.
*
*/
